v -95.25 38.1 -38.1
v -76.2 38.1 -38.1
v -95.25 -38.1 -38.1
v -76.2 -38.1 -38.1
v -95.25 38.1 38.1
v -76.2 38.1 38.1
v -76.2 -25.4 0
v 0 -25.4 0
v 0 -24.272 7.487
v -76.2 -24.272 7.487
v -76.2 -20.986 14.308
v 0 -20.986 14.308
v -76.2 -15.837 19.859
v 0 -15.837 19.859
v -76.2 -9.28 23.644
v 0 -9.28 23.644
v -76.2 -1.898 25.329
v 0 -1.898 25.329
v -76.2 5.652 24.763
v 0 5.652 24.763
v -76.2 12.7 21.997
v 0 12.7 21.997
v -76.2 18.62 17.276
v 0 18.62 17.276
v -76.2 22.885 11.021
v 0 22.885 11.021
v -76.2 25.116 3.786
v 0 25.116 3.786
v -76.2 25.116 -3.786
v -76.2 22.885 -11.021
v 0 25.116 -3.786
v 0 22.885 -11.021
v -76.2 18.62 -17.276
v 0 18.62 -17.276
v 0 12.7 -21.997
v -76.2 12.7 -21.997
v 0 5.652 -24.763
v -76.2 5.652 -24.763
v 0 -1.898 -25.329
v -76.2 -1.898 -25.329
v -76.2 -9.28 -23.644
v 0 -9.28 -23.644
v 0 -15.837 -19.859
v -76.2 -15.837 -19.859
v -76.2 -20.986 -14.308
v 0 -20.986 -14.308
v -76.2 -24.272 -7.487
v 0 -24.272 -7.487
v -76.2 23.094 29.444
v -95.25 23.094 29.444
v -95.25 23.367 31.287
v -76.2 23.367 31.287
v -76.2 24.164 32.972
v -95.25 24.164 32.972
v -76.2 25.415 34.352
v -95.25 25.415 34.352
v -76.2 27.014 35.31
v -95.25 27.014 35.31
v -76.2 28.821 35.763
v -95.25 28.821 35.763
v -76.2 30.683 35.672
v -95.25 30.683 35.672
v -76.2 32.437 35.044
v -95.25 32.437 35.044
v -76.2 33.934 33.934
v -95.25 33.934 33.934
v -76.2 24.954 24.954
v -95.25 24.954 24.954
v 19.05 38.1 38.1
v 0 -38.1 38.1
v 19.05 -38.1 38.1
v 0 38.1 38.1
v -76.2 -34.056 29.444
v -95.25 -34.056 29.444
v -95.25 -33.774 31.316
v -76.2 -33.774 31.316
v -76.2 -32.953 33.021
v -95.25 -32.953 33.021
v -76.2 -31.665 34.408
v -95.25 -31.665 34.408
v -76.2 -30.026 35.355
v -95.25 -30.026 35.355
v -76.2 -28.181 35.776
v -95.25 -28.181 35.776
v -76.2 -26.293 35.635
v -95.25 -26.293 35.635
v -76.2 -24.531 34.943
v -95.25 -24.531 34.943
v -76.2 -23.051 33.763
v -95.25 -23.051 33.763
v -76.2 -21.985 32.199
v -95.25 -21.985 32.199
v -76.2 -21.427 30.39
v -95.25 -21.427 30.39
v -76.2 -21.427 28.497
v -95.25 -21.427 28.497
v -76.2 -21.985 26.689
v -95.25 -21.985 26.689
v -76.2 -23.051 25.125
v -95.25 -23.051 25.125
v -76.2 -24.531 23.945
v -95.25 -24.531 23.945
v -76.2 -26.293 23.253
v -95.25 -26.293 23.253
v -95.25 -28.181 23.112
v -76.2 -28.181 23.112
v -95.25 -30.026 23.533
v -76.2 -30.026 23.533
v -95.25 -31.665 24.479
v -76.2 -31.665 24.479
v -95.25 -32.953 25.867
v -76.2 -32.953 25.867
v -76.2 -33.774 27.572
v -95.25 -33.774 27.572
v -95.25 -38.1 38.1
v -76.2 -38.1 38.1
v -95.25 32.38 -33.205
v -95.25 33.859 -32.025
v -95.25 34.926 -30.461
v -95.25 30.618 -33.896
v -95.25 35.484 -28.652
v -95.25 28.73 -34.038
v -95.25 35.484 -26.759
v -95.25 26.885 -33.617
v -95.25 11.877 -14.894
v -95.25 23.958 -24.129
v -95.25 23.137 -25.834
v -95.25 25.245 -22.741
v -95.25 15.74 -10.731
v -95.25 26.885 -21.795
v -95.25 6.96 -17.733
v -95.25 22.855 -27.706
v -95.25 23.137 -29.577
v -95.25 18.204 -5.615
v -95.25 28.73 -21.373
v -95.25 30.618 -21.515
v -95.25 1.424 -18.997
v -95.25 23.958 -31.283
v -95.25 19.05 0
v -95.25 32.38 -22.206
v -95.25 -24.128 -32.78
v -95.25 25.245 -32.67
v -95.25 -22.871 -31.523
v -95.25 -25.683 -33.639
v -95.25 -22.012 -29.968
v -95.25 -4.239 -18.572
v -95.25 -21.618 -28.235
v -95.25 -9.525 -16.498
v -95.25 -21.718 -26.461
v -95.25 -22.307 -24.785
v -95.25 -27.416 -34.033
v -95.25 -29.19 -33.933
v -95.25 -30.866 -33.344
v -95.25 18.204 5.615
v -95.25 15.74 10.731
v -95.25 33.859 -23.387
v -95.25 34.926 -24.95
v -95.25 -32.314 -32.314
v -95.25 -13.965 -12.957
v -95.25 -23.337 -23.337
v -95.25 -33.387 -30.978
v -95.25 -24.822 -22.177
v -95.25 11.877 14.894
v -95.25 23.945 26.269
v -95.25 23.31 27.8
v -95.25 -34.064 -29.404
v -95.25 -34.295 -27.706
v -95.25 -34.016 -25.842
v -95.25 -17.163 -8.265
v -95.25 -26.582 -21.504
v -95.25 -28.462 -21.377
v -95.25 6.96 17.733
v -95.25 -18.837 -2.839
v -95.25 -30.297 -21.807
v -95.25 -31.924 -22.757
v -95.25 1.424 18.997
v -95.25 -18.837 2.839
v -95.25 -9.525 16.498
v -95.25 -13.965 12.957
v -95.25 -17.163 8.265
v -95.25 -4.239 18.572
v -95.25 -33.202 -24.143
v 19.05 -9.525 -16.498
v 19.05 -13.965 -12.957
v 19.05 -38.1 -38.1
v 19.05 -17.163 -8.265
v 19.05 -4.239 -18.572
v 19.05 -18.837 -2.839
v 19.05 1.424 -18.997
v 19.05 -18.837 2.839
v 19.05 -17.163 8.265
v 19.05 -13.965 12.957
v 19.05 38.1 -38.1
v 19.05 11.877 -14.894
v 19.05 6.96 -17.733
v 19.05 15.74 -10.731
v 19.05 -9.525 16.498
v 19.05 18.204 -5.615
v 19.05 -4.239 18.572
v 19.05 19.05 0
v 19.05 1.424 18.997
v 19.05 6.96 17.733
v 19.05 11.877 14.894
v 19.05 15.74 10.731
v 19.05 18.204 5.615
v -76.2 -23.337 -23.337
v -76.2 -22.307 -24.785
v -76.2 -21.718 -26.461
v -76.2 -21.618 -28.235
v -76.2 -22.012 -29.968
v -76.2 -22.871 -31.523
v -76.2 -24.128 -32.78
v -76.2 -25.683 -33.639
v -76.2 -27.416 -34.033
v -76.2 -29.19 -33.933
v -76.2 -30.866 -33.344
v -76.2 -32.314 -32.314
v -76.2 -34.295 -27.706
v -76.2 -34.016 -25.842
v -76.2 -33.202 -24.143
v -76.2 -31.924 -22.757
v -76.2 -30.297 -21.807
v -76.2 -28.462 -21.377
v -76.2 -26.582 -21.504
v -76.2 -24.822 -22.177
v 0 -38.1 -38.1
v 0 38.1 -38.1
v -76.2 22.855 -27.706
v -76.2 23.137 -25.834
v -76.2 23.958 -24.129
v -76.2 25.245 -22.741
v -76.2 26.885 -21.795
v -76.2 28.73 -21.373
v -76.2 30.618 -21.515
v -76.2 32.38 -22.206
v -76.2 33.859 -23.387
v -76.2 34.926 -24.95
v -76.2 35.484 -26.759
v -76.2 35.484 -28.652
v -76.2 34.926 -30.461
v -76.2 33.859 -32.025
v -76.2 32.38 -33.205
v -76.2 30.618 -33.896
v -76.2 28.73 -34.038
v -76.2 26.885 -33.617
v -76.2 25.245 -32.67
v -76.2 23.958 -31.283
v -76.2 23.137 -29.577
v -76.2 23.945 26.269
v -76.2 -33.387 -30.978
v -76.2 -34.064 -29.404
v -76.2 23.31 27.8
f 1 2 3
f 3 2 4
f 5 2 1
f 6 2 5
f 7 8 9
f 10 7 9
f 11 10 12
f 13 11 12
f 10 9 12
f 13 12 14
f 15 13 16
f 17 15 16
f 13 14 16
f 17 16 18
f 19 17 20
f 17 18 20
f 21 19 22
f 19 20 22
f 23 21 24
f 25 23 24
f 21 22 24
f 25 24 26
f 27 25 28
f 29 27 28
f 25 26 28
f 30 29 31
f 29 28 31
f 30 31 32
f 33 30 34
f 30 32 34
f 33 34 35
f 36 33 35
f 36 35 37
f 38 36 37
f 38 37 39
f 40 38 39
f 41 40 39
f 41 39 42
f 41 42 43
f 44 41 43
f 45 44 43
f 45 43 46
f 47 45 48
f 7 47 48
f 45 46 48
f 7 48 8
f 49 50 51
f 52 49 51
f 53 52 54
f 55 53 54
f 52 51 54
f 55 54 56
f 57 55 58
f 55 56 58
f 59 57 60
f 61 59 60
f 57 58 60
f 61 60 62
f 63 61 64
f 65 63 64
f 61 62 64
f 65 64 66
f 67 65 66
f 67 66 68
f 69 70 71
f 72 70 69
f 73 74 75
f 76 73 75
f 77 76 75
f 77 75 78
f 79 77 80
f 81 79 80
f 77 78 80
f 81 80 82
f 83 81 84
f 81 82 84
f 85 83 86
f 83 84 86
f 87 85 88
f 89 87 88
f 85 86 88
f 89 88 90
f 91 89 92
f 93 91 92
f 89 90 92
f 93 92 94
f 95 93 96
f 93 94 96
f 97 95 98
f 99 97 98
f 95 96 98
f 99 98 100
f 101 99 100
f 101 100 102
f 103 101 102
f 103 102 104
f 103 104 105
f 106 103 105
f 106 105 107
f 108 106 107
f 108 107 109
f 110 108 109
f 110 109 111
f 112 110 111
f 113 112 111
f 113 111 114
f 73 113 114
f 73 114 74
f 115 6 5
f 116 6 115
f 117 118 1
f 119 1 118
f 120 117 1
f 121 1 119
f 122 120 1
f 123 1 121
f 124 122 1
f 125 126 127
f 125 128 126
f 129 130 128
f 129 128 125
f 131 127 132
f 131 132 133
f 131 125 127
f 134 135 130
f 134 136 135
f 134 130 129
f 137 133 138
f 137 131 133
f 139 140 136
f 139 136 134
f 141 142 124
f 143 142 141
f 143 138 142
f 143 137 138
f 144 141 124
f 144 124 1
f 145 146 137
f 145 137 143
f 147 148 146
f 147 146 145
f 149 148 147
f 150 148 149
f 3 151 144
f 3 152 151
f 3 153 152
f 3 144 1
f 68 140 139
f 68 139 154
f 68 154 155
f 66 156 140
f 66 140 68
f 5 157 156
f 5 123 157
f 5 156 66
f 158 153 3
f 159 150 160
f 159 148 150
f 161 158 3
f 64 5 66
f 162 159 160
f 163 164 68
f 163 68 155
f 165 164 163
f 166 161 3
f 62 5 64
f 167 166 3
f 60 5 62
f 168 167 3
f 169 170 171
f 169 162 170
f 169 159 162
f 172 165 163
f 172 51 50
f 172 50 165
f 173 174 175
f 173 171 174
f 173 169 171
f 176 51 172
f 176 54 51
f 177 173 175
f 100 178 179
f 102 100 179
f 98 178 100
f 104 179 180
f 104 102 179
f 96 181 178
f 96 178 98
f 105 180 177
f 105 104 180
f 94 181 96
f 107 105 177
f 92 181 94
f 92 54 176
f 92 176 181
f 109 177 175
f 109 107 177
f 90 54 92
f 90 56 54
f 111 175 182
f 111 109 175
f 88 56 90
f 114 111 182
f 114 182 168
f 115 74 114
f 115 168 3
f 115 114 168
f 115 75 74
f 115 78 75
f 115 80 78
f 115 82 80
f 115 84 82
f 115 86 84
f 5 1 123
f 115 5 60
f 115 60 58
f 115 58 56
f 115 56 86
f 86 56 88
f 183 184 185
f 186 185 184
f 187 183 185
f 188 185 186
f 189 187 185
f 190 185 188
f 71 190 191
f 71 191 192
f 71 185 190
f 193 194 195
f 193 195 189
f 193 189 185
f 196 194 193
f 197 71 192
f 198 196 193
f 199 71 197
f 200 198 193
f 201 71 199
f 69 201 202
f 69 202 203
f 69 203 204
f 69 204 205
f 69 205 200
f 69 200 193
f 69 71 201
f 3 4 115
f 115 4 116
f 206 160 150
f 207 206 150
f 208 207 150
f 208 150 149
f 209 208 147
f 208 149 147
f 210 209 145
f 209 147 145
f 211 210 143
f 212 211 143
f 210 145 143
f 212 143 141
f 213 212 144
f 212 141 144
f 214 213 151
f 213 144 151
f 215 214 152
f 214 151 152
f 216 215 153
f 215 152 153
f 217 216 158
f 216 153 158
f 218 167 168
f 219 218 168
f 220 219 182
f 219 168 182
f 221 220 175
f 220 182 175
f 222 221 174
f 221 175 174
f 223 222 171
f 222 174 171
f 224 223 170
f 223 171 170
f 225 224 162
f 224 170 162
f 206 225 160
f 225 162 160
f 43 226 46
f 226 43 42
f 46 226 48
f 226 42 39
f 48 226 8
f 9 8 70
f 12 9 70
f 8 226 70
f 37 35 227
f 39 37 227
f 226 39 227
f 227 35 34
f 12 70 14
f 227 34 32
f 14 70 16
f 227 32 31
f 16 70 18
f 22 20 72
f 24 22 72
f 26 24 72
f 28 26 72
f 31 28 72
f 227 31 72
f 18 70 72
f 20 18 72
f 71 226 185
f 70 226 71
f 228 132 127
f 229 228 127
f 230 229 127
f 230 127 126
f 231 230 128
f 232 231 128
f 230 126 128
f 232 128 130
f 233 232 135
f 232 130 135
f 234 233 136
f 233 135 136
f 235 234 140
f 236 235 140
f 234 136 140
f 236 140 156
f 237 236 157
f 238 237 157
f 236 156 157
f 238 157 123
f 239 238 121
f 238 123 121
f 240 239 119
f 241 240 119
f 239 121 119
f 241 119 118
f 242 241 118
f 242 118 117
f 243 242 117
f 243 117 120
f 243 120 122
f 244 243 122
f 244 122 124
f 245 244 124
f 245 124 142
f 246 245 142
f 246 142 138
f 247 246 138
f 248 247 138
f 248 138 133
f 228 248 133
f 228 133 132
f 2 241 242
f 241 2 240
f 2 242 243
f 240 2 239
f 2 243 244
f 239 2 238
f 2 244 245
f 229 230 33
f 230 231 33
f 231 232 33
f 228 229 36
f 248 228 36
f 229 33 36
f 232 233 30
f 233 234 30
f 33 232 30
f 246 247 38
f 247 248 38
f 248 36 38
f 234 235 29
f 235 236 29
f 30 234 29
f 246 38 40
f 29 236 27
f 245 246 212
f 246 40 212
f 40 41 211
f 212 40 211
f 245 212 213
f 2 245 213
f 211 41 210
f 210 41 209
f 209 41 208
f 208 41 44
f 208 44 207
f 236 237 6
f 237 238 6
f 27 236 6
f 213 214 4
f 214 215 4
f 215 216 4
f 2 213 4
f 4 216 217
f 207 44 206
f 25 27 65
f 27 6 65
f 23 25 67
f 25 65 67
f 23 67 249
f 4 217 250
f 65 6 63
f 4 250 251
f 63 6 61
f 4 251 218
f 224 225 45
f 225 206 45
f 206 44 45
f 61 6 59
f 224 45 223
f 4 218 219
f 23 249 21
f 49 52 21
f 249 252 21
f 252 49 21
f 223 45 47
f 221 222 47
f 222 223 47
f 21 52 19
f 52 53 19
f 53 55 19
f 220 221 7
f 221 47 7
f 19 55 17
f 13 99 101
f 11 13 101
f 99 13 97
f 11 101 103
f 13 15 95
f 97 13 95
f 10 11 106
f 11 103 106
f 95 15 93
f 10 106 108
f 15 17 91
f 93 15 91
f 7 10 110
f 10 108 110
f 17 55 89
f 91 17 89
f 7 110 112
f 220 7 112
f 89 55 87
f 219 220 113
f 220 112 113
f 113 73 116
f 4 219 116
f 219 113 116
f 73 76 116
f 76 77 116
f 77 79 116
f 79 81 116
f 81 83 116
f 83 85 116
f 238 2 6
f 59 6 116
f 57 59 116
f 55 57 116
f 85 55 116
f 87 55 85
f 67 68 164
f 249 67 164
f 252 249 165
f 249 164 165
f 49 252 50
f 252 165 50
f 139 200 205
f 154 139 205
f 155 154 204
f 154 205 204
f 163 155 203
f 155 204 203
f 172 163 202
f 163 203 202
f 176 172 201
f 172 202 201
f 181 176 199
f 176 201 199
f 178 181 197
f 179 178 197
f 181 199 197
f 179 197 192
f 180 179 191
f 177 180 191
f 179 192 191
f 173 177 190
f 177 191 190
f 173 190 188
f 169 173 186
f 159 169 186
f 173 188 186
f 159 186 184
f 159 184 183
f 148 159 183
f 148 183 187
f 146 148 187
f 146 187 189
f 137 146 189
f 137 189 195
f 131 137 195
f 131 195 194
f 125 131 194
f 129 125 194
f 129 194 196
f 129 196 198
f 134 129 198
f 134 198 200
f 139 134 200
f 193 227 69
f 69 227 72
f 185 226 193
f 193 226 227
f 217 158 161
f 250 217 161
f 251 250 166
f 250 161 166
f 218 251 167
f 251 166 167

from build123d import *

# Parameters (mm, degrees)
F0_W      = 76.2
F0_H      = 76.2
F1_DEPTH  = 19.05
F2_R      = 25.4
F3_DEPTH  = 76.2
F4_W      = 76.2
F4_H      = 76.2
F4_R      = 25.4
F5_DEPTH  = 19.05
F6_R      = 25.4
F7_DEPTH  = 19.05
F9_R      = 19.05
F10_DEPTH = 114.3
F8_R      = 19.05
F11_DEPTH = 608.076
F13_R     = 6.35
F14_DEPTH = 50.546


with BuildPart() as f1:
    # F0 (on Right) → F1 (new body)
    with BuildSketch(Plane.YZ):
        Rectangle(F0_W, F0_H)
    extrude(amount=F1_DEPTH)

    # F2 (on face) → F3 (join)
    with BuildSketch(Plane(origin=(0, 0, 0), x_dir=(0, -1, 0), z_dir=(-1, 0, 0))):
        Circle(F2_R)
    extrude(amount=F3_DEPTH)


with BuildPart() as f5:
    # F4 (on face) → F5 (new body)
    with BuildSketch(Plane(origin=(-76.2, 0, 0), x_dir=(0, -1, 0), z_dir=(-1, 0, 0))):
        Rectangle(F4_W, F4_H)
        Circle(F4_R, mode=Mode.SUBTRACT)
    extrude(amount=F5_DEPTH)


with BuildPart() as f7:
    # F6 (on face) → F7 (new body)
    with BuildSketch(Plane(origin=(-76.2, 0, 0), x_dir=(0, -1, 0), z_dir=(-1, 0, 0))):
        Circle(F6_R)
    extrude(amount=F7_DEPTH)


with BuildPart() as f10_tool:
    # F9 (on face) → F10 (new body)
    with BuildSketch(Plane.YZ.offset(19.05)):
        Circle(F9_R)
    extrude(amount=-F10_DEPTH)


with BuildPart() as f1_1:
    add(f1.part)

    # F10: cut by f10_tool
    add(f10_tool.part, mode=Mode.SUBTRACT)

    # F8 (on face) → F11 (cut)
    with BuildSketch(Plane(origin=(-95.25, 0, 0), x_dir=(0, -1, 0), z_dir=(-1, 0, 0))):
        Circle(F8_R)
    extrude(amount=-F11_DEPTH, mode=Mode.SUBTRACT)


with BuildPart() as f7_1:
    add(f7.part)

    # F10: cut by f10_tool
    add(f10_tool.part, mode=Mode.SUBTRACT)


with BuildPart() as f5_1:
    add(f5.part)

    # F12: union F7, F1
    add(f7_1.part)
    add(f1_1.part)

    # F13 (on face) → F14 (cut)
    with BuildSketch(Plane(origin=(-95.25, 0, 0), x_dir=(0, -1, 0), z_dir=(-1, 0, 0))):
        with Locations((-29.2046008315, -27.7056374614)):
            Circle(F13_R)
        with Locations((27.7061383014, 29.4438616986)):
            Circle(F13_R)
        with BuildLine():
            ThreePointArc((-23.0938616986, 29.4438616986), (-27.0138219031, 35.3104967301), (-33.9339897591, 33.9339897591))
            Line((-33.9339897591, 33.9339897591), (-24.9537336381, 24.9537336381))
            ThreePointArc((-24.9537336381, 24.9537336381), (-23.5772266672, 27.0138219031), (-23.0938616986, 29.4438616986))
        make_face()
        with BuildLine():
            ThreePointArc((23.3369908748, -23.3369908748), (23.455271108, -32.1957655219), (32.3140457551, -32.3140457551))
            Line((32.3140457551, -32.3140457551), (23.3369908748, -23.3369908748))
        make_face()
        with BuildLine():
            Line((23.3369908748, -23.3369908748), (32.3140457551, -32.3140457551))
            ThreePointArc((32.3140457551, -32.3140457551), (33.7790689323, -30.213783607), (34.2953991685, -27.7056374614))
            ThreePointArc((34.2953991685, -27.7056374614), (30.2968994699, -21.8070828645), (23.3369908748, -23.3369908748))
        make_face()
    extrude(amount=-F14_DEPTH, mode=Mode.SUBTRACT)


solid = f5_1.part
